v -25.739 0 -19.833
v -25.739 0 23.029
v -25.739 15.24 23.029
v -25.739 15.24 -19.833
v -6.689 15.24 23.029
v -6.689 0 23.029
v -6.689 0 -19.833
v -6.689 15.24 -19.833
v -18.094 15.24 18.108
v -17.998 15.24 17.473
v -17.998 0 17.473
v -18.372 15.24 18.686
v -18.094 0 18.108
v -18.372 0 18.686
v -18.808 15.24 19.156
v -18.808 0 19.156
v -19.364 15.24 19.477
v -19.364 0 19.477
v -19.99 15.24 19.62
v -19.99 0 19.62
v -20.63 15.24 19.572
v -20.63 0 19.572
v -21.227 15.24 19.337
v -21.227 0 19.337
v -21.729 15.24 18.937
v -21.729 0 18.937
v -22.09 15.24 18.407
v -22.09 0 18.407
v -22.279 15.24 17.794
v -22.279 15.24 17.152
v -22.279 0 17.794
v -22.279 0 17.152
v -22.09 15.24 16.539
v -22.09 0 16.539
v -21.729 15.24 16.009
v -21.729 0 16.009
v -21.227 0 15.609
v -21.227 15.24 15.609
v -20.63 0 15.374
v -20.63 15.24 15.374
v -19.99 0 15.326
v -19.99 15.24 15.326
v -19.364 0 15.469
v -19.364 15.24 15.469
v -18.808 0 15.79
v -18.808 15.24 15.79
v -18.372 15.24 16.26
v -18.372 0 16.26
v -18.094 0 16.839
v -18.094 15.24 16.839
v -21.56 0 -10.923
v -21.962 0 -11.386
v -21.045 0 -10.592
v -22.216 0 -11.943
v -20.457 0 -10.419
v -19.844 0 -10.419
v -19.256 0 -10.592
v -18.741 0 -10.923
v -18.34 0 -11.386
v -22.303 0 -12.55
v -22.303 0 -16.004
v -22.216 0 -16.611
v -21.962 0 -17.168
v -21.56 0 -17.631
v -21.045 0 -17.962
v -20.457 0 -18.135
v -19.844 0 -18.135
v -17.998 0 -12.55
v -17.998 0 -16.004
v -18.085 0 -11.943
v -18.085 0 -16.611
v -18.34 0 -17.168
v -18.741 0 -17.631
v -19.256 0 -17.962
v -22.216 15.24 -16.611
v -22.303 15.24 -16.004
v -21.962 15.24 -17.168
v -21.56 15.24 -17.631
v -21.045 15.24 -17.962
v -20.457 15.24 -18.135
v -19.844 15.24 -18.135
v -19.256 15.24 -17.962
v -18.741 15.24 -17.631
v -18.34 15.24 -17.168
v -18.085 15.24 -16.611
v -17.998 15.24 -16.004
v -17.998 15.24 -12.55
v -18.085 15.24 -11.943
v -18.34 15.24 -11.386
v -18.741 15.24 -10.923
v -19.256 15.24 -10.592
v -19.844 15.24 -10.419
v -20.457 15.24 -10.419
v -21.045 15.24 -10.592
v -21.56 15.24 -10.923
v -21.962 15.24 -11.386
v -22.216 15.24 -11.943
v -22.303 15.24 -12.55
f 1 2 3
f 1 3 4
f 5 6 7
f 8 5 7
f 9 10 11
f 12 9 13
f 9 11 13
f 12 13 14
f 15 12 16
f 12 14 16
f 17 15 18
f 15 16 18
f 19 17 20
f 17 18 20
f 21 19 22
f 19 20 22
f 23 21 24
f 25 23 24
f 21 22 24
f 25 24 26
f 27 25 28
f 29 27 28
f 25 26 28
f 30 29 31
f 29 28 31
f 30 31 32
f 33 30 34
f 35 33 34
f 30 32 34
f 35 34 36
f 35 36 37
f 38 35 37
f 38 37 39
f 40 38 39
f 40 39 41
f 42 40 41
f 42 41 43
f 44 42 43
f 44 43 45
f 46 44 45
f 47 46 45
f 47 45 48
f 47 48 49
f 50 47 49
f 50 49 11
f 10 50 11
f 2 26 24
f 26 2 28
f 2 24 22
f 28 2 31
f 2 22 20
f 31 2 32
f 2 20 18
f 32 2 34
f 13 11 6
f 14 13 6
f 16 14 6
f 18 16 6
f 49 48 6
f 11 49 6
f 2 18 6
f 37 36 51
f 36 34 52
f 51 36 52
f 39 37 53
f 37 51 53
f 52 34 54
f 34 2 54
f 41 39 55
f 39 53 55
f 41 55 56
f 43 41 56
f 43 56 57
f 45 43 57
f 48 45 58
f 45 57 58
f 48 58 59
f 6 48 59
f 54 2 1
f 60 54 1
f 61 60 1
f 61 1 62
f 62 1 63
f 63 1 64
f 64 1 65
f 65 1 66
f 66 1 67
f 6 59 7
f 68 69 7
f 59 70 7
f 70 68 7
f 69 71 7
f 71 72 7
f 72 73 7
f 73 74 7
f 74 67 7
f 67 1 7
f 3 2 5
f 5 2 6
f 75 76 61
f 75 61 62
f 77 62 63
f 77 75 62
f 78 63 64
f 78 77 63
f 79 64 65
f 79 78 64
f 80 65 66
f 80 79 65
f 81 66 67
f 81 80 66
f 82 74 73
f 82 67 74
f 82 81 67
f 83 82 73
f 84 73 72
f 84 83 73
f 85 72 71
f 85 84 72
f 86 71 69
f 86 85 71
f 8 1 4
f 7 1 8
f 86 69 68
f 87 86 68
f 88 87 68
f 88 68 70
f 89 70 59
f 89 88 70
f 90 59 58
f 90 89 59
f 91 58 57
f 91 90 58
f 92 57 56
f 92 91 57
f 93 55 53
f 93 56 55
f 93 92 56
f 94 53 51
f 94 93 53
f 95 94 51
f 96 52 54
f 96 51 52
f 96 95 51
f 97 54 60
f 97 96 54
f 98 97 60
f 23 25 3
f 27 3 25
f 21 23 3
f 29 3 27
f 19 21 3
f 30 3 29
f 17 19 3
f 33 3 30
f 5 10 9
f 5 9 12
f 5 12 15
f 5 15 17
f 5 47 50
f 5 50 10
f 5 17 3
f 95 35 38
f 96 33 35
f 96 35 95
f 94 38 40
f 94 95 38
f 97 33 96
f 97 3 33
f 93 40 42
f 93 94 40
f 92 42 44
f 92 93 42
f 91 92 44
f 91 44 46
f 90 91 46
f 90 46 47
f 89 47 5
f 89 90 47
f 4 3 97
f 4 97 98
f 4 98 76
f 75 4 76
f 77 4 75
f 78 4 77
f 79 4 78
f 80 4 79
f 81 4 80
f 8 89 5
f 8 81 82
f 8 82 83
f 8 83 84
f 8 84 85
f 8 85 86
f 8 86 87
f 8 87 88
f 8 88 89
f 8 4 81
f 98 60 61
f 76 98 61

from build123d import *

# Parameters (mm, degrees)
SKETCH1_W                        = 19.05
SKETCH1_H                        = 42.8625
BOSS_EXTRUDE1_DEPTH              = 15.24
F_18_0_1695_DIAMETER_HOLE1_D     = 4.3053
F_18_0_1695_DIAMETER_HOLE1_DEPTH = 15.24
CUT_EXTRUDE1_REACH               = 17.24


with BuildPart() as part:
    # Sketch1 → Boss-Extrude1 (new body)
    with BuildSketch(Plane(origin=(0, 0, 0), x_dir=(1, 0, 0), z_dir=(0, 1, 0))):
        with Locations((-16.213580696, -1.598006412)):
            Rectangle(SKETCH1_W, SKETCH1_H)
    extrude(amount=BOSS_EXTRUDE1_DEPTH)

    # #18 (0.1695) Diameter Hole1
    with Locations(Plane(origin=(0, 15.24, 0), x_dir=(-1, 0, 0), z_dir=(0, 1, 0))):
        with Locations((20.150580696, 17.473006412)):
            Hole(F_18_0_1695_DIAMETER_HOLE1_D / 2, depth=F_18_0_1695_DIAMETER_HOLE1_DEPTH)

    # Sketch4 → Cut-Extrude1 (cut, up to next)
    with BuildSketch(Plane(origin=(0, 15.24, 0), x_dir=(1, 0, 0), z_dir=(0, 1, 0)), mode=Mode.PRIVATE) as cut_extrude1_sk1:
        with BuildLine():
            Line((-17.997930696, 16.004193588), (-17.997930696, 12.549793588))
            ThreePointArc((-17.997930696, 12.549793588), (-20.150580696, 10.397143588), (-22.303230696, 12.549793588))
            Line((-22.303230696, 12.549793588), (-22.303230696, 16.004193588))
            ThreePointArc((-22.303230696, 16.004193588), (-20.150580696, 18.156843588), (-17.997930696, 16.004193588))
        make_face()
    cut_extrude1_tool1 = extrude(cut_extrude1_sk1.sketch, amount=-CUT_EXTRUDE1_REACH, mode=Mode.PRIVATE) & part.part
    add(cut_extrude1_tool1.solids().sort_by_distance((-20.150581, 15.24, -14.276994))[0], mode=Mode.SUBTRACT)


solid = part.part
